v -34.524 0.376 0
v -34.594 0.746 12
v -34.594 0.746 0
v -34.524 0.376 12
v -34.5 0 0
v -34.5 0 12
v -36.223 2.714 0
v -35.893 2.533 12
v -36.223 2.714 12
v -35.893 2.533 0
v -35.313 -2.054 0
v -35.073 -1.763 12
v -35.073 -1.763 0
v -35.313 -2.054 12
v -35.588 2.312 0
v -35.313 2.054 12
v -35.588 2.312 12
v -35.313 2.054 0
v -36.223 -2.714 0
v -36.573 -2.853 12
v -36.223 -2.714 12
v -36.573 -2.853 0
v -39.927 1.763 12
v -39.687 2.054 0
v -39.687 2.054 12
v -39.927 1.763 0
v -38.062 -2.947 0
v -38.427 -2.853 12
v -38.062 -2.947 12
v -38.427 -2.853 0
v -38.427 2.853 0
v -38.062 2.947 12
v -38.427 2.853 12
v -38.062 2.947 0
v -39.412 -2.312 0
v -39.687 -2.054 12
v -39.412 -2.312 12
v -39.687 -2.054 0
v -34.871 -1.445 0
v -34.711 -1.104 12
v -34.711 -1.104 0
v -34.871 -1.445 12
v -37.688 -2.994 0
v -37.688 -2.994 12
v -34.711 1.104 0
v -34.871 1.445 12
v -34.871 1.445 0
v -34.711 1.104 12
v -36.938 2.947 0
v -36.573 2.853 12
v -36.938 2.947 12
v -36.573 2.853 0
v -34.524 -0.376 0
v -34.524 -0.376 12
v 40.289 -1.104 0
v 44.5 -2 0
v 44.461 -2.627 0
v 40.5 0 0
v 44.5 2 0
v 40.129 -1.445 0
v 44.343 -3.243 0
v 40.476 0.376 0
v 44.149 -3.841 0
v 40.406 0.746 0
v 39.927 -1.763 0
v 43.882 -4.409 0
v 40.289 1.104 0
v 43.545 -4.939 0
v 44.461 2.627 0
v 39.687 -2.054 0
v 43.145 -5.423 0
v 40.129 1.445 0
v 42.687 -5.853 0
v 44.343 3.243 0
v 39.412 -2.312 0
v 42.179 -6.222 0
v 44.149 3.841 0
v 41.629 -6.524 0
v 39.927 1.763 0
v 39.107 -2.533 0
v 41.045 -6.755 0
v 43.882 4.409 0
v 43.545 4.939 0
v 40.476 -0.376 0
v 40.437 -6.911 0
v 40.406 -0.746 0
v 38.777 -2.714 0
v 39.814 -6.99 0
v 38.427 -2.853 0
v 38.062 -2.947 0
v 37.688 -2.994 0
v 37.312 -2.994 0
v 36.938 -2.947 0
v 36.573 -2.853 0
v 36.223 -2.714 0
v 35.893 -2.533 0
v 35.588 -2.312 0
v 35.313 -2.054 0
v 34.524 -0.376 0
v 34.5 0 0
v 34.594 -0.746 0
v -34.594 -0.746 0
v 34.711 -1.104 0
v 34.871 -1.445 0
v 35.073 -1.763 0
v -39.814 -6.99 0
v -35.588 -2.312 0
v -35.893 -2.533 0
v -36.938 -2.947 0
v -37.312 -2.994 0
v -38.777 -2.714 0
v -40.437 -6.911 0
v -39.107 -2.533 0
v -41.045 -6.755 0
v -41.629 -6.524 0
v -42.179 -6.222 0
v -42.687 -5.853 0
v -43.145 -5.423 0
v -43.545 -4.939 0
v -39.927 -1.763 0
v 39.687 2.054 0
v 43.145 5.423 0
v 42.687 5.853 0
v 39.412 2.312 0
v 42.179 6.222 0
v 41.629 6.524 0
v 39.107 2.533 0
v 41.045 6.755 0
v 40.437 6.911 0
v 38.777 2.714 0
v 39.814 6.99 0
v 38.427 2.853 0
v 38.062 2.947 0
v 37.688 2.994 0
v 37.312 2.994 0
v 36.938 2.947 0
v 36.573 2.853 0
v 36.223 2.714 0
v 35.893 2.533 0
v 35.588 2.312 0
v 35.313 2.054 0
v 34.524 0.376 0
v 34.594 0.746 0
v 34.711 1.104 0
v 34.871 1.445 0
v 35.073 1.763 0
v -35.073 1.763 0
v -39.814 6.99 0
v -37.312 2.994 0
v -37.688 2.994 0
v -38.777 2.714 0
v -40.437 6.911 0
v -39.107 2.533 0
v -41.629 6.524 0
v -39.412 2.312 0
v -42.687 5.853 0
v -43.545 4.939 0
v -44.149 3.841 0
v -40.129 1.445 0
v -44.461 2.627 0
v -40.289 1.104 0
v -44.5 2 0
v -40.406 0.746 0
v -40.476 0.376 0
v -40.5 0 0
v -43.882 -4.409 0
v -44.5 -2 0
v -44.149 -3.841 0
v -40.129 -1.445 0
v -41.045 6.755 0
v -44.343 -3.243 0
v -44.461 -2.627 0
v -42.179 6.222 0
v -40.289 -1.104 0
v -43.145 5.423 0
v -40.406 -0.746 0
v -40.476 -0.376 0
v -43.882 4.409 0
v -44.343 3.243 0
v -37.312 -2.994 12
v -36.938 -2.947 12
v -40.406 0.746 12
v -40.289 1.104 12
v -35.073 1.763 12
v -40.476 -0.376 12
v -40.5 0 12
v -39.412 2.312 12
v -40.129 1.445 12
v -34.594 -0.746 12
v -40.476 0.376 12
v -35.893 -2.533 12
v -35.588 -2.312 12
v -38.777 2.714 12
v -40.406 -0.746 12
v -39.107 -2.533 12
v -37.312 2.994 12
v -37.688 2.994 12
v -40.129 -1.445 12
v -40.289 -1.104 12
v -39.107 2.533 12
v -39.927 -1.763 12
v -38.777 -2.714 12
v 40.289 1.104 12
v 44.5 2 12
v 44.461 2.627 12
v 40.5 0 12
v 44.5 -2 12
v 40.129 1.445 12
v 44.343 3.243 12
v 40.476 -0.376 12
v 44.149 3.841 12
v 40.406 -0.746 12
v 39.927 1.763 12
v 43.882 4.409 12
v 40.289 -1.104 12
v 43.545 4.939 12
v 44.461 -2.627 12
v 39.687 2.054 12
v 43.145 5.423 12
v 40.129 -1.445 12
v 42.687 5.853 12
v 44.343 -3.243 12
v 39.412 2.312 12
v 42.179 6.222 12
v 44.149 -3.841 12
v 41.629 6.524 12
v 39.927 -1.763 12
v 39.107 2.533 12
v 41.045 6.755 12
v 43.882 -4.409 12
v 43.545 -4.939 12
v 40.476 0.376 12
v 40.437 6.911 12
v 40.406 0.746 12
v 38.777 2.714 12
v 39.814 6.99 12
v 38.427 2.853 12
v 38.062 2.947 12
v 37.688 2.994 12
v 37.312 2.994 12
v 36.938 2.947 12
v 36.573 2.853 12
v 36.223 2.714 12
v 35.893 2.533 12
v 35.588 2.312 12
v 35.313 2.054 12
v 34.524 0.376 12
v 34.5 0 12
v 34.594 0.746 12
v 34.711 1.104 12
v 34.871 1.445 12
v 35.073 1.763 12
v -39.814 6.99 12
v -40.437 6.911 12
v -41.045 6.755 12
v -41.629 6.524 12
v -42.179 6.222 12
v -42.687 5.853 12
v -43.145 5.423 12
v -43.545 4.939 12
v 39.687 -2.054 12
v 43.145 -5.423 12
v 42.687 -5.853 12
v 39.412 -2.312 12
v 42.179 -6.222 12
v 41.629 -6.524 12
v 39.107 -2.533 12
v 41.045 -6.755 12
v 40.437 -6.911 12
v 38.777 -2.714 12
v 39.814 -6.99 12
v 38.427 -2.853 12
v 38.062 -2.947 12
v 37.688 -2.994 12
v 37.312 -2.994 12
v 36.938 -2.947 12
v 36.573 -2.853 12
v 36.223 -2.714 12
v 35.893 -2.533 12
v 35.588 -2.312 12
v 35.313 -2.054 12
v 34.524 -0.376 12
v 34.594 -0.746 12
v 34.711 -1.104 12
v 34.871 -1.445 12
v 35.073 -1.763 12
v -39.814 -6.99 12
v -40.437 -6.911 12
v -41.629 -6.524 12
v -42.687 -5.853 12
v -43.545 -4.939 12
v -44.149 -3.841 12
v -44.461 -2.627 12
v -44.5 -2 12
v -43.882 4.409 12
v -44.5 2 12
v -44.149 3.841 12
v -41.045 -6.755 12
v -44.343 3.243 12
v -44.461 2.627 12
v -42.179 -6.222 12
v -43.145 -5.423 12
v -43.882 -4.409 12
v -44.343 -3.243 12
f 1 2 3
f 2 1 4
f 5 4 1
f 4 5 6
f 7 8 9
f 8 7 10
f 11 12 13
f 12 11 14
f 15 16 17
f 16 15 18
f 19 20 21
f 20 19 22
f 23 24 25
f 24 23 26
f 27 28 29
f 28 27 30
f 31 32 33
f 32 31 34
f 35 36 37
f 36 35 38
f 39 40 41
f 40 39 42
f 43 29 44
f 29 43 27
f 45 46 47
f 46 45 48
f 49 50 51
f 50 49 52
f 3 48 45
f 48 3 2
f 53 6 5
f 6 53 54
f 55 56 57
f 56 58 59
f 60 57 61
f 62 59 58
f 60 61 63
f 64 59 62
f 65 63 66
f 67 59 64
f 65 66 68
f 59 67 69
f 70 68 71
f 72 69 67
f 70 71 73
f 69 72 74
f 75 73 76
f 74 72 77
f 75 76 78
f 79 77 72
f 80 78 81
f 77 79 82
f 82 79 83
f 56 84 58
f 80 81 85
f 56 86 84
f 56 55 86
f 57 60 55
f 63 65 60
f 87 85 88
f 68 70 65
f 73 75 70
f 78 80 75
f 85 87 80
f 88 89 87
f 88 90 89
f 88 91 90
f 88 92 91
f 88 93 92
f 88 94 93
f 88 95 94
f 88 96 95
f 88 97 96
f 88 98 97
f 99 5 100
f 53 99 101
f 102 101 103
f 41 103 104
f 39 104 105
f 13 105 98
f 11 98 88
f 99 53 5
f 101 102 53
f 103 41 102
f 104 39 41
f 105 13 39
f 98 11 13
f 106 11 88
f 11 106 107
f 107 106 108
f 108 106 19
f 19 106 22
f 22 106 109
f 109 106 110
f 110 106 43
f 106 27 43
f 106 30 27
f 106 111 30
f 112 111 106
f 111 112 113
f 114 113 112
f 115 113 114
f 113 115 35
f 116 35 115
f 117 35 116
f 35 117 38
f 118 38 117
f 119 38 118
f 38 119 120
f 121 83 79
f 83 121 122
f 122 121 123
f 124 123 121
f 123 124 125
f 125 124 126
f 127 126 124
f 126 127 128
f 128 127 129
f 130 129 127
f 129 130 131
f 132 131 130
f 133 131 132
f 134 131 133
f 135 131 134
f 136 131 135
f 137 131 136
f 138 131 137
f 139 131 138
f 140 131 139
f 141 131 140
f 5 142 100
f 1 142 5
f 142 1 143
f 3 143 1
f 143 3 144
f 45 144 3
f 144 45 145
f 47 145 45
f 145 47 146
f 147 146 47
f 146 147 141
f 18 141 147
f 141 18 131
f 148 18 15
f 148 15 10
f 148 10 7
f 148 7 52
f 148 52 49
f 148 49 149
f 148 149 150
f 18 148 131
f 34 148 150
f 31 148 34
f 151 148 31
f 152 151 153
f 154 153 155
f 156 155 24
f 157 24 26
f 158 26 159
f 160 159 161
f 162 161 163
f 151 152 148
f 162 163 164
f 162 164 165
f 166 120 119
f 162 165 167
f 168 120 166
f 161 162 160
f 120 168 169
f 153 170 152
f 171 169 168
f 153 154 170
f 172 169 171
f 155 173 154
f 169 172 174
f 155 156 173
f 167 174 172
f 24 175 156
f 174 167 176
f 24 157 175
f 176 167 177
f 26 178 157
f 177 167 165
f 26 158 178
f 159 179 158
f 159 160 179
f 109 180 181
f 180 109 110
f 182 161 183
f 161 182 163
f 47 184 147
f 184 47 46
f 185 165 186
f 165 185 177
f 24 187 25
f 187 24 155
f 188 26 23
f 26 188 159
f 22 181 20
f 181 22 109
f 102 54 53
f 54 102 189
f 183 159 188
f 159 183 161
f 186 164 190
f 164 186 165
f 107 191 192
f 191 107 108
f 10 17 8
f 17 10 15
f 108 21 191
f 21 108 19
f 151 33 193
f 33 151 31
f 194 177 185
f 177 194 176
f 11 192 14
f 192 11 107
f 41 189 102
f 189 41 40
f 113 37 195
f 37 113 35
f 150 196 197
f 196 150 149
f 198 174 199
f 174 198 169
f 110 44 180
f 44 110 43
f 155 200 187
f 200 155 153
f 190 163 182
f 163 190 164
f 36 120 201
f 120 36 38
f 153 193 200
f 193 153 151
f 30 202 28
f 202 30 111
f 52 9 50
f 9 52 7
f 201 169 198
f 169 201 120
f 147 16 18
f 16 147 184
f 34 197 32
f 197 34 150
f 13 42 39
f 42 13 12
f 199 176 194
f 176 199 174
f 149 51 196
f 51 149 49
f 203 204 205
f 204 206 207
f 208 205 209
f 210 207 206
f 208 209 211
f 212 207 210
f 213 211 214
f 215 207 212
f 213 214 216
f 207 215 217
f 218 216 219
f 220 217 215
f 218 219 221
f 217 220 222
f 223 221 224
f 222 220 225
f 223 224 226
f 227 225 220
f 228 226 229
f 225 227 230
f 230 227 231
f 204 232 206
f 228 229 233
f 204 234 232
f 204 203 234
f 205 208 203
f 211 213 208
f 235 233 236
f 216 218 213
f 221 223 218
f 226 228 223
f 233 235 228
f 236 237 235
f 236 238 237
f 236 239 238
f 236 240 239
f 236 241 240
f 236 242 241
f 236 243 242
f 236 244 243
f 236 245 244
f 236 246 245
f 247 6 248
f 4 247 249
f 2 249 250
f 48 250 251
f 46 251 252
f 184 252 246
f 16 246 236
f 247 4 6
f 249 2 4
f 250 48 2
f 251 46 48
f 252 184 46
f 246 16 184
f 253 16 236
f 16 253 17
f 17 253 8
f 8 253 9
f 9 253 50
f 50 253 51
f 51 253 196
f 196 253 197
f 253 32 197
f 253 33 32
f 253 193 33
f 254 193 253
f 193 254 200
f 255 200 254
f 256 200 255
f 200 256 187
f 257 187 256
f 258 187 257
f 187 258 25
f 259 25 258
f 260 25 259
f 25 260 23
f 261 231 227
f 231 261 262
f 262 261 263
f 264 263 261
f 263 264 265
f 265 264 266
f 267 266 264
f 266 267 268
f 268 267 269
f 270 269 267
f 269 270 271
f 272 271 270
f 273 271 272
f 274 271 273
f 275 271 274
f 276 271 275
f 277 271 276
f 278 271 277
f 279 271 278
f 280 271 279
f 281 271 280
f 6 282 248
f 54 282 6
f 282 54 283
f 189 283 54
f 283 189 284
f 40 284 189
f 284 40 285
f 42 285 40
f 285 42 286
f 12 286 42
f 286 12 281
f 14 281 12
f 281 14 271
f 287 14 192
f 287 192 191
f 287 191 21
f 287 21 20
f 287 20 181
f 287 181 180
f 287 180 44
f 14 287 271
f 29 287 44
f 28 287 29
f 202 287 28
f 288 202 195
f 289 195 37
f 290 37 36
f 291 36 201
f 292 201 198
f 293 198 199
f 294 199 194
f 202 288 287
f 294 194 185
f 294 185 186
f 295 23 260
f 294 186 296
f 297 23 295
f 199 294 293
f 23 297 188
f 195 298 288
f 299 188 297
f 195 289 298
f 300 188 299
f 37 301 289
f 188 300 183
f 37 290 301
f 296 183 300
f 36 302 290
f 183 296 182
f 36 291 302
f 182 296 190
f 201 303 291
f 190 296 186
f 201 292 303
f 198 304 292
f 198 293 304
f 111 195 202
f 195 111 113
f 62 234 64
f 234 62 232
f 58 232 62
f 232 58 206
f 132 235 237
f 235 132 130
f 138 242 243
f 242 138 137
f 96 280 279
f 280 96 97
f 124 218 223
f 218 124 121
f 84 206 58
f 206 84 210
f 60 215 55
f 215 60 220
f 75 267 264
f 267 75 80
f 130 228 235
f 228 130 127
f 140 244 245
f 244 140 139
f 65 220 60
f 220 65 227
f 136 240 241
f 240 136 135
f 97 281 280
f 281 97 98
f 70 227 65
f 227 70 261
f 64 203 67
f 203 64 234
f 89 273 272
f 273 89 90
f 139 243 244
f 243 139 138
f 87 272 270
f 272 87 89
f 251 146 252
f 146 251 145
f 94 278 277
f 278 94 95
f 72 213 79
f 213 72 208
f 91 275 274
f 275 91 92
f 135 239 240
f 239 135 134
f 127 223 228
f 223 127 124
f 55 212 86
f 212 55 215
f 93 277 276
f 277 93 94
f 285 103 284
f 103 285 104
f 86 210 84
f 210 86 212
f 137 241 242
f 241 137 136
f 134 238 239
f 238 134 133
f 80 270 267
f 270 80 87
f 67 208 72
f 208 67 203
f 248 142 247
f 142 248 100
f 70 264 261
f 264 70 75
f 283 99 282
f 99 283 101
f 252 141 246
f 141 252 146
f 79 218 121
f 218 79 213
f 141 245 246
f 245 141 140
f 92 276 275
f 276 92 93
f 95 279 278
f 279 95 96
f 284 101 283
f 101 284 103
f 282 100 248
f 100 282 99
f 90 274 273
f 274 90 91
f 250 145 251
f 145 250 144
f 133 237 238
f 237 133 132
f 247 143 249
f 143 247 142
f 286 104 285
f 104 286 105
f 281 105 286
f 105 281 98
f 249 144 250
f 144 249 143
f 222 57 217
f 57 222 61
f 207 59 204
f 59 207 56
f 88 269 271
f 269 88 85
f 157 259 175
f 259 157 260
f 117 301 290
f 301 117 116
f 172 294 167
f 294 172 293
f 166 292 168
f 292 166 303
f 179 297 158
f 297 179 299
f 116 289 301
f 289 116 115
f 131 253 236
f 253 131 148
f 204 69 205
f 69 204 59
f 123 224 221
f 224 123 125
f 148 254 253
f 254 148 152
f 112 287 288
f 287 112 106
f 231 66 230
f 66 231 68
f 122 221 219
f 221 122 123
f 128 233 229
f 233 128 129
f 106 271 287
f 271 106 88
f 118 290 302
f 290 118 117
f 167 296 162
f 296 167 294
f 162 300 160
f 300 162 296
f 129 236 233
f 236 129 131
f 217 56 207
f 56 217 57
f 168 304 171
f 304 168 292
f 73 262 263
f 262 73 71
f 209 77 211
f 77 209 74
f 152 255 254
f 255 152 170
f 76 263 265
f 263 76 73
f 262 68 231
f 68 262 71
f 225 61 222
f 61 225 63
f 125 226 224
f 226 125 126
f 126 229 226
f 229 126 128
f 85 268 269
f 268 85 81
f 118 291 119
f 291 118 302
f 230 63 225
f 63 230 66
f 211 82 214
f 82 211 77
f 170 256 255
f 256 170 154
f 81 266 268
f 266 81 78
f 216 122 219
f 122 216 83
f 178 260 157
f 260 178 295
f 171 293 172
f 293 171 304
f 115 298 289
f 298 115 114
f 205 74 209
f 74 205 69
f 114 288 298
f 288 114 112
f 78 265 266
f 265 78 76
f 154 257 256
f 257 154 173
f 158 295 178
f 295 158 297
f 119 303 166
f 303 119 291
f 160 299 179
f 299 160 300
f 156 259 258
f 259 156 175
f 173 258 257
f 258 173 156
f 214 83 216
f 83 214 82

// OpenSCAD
$fn = 50;


difference() {
	union() {
		hull() {
			translate(v = [-39.5000000000, 2.0000000000, 0]) {
				cylinder(h = 12, r = 5);
			}
			translate(v = [39.5000000000, 2.0000000000, 0]) {
				cylinder(h = 12, r = 5);
			}
			translate(v = [-39.5000000000, -2.0000000000, 0]) {
				cylinder(h = 12, r = 5);
			}
			translate(v = [39.5000000000, -2.0000000000, 0]) {
				cylinder(h = 12, r = 5);
			}
		}
	}
	union() {
		translate(v = [-37.5000000000, 0.0000000000, 0]) {
			cylinder(h = 12, r = 3.0000000000);
		}
		translate(v = [37.5000000000, 0.0000000000, 0]) {
			cylinder(h = 12, r = 3.0000000000);
		}
		translate(v = [-37.5000000000, 0.0000000000, 0]) {
			cylinder(h = 12, r = 1.5000000000);
		}
		translate(v = [37.5000000000, 0.0000000000, 0]) {
			cylinder(h = 12, r = 1.5000000000);
		}
		translate(v = [-37.5000000000, 0.0000000000, 0]) {
			cylinder(h = 12, r = 1.5000000000);
		}
		translate(v = [37.5000000000, 0.0000000000, 0]) {
			cylinder(h = 12, r = 1.5000000000);
		}
		translate(v = [-37.5000000000, 0.0000000000, 0]) {
			cylinder(h = 12, r = 1.5000000000);
		}
		translate(v = [37.5000000000, 0.0000000000, 0]) {
			cylinder(h = 12, r = 1.5000000000);
		}
	}
}
